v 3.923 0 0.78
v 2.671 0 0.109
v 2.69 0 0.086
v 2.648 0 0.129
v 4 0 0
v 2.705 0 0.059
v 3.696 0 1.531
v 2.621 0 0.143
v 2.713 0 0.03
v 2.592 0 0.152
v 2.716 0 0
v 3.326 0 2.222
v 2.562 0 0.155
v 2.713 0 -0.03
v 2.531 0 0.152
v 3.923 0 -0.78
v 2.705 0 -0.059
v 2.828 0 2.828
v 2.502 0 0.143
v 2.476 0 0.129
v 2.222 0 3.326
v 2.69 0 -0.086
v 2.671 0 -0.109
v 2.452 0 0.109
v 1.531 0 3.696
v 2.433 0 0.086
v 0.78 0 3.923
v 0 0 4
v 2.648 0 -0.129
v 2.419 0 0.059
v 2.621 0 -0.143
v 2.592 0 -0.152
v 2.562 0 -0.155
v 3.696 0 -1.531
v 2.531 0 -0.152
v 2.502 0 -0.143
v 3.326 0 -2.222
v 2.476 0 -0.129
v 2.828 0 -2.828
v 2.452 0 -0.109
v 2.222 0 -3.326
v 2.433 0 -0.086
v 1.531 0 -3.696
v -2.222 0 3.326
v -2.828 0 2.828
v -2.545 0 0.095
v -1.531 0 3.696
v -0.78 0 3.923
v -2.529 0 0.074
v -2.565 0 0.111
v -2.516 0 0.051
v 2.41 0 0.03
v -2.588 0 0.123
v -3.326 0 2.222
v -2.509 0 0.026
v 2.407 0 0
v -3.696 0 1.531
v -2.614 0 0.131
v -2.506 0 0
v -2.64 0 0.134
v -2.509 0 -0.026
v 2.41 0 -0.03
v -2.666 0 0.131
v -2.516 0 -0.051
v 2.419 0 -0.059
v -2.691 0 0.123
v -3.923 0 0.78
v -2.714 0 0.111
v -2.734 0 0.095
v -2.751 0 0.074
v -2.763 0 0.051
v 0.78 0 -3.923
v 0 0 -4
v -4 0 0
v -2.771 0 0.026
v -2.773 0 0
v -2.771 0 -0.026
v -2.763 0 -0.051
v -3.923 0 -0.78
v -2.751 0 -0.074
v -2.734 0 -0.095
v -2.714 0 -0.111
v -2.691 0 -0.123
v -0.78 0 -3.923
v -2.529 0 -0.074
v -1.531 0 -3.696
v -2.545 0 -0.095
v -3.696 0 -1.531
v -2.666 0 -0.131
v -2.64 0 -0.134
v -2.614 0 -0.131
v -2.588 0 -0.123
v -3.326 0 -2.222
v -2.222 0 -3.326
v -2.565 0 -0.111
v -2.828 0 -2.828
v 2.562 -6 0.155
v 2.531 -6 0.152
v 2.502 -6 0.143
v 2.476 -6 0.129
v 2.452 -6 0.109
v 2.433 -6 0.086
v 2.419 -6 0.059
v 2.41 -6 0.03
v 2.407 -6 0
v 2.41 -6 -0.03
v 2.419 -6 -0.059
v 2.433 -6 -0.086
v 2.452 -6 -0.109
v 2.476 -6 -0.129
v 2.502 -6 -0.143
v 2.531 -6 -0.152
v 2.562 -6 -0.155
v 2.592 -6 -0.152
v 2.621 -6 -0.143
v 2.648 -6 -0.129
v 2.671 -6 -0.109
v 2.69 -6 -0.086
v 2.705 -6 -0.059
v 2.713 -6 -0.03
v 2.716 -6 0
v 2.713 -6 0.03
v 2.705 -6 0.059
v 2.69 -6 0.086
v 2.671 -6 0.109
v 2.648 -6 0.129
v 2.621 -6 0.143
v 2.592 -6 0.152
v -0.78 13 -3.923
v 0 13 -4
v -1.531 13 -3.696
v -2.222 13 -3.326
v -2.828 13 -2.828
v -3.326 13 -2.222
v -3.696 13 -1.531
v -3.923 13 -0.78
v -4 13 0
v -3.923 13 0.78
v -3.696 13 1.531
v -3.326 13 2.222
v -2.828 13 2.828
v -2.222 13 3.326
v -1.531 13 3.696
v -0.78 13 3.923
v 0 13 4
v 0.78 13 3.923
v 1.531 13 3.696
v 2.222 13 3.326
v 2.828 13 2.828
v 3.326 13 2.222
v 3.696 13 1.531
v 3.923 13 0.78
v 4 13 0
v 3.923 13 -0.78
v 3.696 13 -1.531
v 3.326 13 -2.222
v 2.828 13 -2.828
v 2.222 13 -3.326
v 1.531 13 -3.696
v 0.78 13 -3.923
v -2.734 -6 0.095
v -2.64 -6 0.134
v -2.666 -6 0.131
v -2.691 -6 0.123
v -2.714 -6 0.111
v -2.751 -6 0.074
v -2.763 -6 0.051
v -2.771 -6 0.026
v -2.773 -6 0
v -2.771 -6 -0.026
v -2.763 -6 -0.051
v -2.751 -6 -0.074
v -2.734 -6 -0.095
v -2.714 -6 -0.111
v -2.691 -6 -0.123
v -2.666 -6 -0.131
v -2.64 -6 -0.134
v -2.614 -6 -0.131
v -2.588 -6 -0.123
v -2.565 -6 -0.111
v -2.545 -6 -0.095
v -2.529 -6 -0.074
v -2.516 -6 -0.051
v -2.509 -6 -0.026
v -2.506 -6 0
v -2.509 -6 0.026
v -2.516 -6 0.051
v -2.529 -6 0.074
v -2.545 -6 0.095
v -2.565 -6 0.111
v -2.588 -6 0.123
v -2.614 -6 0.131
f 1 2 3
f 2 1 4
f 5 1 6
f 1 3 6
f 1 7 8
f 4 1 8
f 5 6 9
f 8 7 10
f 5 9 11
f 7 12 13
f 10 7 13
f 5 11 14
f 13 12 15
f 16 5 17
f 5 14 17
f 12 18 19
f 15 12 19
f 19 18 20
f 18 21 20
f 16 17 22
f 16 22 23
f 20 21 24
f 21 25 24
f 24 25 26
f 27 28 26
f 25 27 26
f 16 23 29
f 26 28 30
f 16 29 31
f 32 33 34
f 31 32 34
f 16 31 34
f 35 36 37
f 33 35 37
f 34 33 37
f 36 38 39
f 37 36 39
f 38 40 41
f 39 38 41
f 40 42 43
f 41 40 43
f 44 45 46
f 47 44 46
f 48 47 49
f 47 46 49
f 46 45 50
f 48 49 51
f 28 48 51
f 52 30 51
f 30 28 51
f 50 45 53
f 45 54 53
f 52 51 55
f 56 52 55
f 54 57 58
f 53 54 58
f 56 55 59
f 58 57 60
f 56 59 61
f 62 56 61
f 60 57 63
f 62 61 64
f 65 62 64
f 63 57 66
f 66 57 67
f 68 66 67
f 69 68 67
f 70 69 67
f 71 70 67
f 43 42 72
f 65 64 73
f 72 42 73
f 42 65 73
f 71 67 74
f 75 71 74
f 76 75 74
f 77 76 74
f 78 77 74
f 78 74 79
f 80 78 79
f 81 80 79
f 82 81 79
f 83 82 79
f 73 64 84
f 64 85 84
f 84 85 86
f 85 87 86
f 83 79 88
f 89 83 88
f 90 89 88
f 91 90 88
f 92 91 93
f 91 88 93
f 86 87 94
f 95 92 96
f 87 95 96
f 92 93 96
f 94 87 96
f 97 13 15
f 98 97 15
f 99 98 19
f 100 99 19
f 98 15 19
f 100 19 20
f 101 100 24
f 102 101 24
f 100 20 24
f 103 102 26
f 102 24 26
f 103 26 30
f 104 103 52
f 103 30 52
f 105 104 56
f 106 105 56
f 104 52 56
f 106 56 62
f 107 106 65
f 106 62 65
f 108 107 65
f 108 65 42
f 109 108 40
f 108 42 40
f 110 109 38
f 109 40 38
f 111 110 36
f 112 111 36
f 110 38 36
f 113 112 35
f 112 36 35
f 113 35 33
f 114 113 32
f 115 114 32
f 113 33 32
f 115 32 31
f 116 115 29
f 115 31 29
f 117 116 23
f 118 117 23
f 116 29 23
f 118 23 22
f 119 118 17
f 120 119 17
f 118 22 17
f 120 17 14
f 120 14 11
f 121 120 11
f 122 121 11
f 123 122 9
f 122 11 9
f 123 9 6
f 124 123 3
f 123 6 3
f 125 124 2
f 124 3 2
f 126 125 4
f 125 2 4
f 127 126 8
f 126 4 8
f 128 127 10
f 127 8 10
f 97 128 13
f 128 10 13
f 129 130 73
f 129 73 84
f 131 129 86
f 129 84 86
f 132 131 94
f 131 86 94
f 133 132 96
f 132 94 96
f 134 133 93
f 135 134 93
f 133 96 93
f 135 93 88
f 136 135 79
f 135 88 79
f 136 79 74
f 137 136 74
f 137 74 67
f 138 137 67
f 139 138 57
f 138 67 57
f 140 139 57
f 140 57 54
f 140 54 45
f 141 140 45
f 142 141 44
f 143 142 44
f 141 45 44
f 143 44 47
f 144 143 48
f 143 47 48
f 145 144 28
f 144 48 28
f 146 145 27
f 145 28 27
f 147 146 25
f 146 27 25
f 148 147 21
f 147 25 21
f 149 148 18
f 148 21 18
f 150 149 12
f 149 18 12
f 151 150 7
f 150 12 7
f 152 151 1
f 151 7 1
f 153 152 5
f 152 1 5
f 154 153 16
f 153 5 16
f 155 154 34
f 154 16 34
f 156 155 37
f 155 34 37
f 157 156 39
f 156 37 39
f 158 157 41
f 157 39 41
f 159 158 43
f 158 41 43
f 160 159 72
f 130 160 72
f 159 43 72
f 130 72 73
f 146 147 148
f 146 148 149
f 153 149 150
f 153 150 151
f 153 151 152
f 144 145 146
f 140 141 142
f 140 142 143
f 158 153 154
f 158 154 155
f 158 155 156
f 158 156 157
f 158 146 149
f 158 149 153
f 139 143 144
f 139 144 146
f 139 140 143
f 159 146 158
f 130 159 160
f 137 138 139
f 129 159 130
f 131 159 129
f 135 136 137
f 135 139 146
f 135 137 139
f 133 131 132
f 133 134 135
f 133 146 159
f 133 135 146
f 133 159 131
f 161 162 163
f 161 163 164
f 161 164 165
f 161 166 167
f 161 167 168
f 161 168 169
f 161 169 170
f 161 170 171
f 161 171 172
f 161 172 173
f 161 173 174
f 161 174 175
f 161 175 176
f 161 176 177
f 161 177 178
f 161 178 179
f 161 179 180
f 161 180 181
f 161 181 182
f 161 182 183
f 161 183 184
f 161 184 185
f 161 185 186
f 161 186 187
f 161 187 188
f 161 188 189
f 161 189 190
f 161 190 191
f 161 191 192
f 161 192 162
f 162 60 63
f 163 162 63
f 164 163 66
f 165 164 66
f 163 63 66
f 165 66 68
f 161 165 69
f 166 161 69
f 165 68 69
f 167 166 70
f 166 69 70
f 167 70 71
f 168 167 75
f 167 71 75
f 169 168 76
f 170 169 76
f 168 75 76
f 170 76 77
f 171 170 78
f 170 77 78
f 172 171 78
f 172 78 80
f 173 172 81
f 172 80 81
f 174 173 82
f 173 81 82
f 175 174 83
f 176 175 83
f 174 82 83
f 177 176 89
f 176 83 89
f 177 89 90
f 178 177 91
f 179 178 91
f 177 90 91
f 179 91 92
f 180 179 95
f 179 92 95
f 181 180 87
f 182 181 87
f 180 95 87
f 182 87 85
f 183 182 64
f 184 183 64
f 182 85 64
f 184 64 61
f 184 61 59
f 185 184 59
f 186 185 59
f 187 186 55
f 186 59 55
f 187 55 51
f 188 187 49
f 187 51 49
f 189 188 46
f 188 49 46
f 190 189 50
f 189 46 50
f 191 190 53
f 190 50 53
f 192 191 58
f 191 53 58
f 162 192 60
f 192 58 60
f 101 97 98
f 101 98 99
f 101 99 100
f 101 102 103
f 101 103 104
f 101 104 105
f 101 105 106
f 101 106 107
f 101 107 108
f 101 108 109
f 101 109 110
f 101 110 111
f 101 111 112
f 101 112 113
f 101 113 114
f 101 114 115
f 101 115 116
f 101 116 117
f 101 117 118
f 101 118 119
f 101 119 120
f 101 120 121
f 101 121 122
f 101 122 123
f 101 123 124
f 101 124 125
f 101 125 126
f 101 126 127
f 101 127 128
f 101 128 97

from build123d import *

# Parameters (mm, degrees)
SKETCH1_R           = 4
BOSS_EXTRUDE1_DEPTH = 13
SKETCH2_R           = 0.133652149
SKETCH2_R_2         = 0.154729583
BOSS_EXTRUDE2_DEPTH = 6


with BuildPart() as part:
    # Sketch1 → Boss-Extrude1 (new body)
    with BuildSketch(Plane(origin=(0, 0, 0), x_dir=(1, 0, 0), z_dir=(0, 1, 0))):
        with Locations(Location((0, 0, 0), (0, 0, 90))):
            Circle(SKETCH1_R)
    extrude(amount=BOSS_EXTRUDE1_DEPTH)

    # Sketch2 → Boss-Extrude2 (add)
    with BuildSketch(Plane.XZ):
        with Locations(Location((-2.639629951, 0, 0), (0, 0, 90))):
            Circle(SKETCH2_R)
        with Locations(Location((2.561666197, 0, 0), (0, 0, 90))):
            Circle(SKETCH2_R_2)
    extrude(amount=BOSS_EXTRUDE2_DEPTH)


solid = part.part
